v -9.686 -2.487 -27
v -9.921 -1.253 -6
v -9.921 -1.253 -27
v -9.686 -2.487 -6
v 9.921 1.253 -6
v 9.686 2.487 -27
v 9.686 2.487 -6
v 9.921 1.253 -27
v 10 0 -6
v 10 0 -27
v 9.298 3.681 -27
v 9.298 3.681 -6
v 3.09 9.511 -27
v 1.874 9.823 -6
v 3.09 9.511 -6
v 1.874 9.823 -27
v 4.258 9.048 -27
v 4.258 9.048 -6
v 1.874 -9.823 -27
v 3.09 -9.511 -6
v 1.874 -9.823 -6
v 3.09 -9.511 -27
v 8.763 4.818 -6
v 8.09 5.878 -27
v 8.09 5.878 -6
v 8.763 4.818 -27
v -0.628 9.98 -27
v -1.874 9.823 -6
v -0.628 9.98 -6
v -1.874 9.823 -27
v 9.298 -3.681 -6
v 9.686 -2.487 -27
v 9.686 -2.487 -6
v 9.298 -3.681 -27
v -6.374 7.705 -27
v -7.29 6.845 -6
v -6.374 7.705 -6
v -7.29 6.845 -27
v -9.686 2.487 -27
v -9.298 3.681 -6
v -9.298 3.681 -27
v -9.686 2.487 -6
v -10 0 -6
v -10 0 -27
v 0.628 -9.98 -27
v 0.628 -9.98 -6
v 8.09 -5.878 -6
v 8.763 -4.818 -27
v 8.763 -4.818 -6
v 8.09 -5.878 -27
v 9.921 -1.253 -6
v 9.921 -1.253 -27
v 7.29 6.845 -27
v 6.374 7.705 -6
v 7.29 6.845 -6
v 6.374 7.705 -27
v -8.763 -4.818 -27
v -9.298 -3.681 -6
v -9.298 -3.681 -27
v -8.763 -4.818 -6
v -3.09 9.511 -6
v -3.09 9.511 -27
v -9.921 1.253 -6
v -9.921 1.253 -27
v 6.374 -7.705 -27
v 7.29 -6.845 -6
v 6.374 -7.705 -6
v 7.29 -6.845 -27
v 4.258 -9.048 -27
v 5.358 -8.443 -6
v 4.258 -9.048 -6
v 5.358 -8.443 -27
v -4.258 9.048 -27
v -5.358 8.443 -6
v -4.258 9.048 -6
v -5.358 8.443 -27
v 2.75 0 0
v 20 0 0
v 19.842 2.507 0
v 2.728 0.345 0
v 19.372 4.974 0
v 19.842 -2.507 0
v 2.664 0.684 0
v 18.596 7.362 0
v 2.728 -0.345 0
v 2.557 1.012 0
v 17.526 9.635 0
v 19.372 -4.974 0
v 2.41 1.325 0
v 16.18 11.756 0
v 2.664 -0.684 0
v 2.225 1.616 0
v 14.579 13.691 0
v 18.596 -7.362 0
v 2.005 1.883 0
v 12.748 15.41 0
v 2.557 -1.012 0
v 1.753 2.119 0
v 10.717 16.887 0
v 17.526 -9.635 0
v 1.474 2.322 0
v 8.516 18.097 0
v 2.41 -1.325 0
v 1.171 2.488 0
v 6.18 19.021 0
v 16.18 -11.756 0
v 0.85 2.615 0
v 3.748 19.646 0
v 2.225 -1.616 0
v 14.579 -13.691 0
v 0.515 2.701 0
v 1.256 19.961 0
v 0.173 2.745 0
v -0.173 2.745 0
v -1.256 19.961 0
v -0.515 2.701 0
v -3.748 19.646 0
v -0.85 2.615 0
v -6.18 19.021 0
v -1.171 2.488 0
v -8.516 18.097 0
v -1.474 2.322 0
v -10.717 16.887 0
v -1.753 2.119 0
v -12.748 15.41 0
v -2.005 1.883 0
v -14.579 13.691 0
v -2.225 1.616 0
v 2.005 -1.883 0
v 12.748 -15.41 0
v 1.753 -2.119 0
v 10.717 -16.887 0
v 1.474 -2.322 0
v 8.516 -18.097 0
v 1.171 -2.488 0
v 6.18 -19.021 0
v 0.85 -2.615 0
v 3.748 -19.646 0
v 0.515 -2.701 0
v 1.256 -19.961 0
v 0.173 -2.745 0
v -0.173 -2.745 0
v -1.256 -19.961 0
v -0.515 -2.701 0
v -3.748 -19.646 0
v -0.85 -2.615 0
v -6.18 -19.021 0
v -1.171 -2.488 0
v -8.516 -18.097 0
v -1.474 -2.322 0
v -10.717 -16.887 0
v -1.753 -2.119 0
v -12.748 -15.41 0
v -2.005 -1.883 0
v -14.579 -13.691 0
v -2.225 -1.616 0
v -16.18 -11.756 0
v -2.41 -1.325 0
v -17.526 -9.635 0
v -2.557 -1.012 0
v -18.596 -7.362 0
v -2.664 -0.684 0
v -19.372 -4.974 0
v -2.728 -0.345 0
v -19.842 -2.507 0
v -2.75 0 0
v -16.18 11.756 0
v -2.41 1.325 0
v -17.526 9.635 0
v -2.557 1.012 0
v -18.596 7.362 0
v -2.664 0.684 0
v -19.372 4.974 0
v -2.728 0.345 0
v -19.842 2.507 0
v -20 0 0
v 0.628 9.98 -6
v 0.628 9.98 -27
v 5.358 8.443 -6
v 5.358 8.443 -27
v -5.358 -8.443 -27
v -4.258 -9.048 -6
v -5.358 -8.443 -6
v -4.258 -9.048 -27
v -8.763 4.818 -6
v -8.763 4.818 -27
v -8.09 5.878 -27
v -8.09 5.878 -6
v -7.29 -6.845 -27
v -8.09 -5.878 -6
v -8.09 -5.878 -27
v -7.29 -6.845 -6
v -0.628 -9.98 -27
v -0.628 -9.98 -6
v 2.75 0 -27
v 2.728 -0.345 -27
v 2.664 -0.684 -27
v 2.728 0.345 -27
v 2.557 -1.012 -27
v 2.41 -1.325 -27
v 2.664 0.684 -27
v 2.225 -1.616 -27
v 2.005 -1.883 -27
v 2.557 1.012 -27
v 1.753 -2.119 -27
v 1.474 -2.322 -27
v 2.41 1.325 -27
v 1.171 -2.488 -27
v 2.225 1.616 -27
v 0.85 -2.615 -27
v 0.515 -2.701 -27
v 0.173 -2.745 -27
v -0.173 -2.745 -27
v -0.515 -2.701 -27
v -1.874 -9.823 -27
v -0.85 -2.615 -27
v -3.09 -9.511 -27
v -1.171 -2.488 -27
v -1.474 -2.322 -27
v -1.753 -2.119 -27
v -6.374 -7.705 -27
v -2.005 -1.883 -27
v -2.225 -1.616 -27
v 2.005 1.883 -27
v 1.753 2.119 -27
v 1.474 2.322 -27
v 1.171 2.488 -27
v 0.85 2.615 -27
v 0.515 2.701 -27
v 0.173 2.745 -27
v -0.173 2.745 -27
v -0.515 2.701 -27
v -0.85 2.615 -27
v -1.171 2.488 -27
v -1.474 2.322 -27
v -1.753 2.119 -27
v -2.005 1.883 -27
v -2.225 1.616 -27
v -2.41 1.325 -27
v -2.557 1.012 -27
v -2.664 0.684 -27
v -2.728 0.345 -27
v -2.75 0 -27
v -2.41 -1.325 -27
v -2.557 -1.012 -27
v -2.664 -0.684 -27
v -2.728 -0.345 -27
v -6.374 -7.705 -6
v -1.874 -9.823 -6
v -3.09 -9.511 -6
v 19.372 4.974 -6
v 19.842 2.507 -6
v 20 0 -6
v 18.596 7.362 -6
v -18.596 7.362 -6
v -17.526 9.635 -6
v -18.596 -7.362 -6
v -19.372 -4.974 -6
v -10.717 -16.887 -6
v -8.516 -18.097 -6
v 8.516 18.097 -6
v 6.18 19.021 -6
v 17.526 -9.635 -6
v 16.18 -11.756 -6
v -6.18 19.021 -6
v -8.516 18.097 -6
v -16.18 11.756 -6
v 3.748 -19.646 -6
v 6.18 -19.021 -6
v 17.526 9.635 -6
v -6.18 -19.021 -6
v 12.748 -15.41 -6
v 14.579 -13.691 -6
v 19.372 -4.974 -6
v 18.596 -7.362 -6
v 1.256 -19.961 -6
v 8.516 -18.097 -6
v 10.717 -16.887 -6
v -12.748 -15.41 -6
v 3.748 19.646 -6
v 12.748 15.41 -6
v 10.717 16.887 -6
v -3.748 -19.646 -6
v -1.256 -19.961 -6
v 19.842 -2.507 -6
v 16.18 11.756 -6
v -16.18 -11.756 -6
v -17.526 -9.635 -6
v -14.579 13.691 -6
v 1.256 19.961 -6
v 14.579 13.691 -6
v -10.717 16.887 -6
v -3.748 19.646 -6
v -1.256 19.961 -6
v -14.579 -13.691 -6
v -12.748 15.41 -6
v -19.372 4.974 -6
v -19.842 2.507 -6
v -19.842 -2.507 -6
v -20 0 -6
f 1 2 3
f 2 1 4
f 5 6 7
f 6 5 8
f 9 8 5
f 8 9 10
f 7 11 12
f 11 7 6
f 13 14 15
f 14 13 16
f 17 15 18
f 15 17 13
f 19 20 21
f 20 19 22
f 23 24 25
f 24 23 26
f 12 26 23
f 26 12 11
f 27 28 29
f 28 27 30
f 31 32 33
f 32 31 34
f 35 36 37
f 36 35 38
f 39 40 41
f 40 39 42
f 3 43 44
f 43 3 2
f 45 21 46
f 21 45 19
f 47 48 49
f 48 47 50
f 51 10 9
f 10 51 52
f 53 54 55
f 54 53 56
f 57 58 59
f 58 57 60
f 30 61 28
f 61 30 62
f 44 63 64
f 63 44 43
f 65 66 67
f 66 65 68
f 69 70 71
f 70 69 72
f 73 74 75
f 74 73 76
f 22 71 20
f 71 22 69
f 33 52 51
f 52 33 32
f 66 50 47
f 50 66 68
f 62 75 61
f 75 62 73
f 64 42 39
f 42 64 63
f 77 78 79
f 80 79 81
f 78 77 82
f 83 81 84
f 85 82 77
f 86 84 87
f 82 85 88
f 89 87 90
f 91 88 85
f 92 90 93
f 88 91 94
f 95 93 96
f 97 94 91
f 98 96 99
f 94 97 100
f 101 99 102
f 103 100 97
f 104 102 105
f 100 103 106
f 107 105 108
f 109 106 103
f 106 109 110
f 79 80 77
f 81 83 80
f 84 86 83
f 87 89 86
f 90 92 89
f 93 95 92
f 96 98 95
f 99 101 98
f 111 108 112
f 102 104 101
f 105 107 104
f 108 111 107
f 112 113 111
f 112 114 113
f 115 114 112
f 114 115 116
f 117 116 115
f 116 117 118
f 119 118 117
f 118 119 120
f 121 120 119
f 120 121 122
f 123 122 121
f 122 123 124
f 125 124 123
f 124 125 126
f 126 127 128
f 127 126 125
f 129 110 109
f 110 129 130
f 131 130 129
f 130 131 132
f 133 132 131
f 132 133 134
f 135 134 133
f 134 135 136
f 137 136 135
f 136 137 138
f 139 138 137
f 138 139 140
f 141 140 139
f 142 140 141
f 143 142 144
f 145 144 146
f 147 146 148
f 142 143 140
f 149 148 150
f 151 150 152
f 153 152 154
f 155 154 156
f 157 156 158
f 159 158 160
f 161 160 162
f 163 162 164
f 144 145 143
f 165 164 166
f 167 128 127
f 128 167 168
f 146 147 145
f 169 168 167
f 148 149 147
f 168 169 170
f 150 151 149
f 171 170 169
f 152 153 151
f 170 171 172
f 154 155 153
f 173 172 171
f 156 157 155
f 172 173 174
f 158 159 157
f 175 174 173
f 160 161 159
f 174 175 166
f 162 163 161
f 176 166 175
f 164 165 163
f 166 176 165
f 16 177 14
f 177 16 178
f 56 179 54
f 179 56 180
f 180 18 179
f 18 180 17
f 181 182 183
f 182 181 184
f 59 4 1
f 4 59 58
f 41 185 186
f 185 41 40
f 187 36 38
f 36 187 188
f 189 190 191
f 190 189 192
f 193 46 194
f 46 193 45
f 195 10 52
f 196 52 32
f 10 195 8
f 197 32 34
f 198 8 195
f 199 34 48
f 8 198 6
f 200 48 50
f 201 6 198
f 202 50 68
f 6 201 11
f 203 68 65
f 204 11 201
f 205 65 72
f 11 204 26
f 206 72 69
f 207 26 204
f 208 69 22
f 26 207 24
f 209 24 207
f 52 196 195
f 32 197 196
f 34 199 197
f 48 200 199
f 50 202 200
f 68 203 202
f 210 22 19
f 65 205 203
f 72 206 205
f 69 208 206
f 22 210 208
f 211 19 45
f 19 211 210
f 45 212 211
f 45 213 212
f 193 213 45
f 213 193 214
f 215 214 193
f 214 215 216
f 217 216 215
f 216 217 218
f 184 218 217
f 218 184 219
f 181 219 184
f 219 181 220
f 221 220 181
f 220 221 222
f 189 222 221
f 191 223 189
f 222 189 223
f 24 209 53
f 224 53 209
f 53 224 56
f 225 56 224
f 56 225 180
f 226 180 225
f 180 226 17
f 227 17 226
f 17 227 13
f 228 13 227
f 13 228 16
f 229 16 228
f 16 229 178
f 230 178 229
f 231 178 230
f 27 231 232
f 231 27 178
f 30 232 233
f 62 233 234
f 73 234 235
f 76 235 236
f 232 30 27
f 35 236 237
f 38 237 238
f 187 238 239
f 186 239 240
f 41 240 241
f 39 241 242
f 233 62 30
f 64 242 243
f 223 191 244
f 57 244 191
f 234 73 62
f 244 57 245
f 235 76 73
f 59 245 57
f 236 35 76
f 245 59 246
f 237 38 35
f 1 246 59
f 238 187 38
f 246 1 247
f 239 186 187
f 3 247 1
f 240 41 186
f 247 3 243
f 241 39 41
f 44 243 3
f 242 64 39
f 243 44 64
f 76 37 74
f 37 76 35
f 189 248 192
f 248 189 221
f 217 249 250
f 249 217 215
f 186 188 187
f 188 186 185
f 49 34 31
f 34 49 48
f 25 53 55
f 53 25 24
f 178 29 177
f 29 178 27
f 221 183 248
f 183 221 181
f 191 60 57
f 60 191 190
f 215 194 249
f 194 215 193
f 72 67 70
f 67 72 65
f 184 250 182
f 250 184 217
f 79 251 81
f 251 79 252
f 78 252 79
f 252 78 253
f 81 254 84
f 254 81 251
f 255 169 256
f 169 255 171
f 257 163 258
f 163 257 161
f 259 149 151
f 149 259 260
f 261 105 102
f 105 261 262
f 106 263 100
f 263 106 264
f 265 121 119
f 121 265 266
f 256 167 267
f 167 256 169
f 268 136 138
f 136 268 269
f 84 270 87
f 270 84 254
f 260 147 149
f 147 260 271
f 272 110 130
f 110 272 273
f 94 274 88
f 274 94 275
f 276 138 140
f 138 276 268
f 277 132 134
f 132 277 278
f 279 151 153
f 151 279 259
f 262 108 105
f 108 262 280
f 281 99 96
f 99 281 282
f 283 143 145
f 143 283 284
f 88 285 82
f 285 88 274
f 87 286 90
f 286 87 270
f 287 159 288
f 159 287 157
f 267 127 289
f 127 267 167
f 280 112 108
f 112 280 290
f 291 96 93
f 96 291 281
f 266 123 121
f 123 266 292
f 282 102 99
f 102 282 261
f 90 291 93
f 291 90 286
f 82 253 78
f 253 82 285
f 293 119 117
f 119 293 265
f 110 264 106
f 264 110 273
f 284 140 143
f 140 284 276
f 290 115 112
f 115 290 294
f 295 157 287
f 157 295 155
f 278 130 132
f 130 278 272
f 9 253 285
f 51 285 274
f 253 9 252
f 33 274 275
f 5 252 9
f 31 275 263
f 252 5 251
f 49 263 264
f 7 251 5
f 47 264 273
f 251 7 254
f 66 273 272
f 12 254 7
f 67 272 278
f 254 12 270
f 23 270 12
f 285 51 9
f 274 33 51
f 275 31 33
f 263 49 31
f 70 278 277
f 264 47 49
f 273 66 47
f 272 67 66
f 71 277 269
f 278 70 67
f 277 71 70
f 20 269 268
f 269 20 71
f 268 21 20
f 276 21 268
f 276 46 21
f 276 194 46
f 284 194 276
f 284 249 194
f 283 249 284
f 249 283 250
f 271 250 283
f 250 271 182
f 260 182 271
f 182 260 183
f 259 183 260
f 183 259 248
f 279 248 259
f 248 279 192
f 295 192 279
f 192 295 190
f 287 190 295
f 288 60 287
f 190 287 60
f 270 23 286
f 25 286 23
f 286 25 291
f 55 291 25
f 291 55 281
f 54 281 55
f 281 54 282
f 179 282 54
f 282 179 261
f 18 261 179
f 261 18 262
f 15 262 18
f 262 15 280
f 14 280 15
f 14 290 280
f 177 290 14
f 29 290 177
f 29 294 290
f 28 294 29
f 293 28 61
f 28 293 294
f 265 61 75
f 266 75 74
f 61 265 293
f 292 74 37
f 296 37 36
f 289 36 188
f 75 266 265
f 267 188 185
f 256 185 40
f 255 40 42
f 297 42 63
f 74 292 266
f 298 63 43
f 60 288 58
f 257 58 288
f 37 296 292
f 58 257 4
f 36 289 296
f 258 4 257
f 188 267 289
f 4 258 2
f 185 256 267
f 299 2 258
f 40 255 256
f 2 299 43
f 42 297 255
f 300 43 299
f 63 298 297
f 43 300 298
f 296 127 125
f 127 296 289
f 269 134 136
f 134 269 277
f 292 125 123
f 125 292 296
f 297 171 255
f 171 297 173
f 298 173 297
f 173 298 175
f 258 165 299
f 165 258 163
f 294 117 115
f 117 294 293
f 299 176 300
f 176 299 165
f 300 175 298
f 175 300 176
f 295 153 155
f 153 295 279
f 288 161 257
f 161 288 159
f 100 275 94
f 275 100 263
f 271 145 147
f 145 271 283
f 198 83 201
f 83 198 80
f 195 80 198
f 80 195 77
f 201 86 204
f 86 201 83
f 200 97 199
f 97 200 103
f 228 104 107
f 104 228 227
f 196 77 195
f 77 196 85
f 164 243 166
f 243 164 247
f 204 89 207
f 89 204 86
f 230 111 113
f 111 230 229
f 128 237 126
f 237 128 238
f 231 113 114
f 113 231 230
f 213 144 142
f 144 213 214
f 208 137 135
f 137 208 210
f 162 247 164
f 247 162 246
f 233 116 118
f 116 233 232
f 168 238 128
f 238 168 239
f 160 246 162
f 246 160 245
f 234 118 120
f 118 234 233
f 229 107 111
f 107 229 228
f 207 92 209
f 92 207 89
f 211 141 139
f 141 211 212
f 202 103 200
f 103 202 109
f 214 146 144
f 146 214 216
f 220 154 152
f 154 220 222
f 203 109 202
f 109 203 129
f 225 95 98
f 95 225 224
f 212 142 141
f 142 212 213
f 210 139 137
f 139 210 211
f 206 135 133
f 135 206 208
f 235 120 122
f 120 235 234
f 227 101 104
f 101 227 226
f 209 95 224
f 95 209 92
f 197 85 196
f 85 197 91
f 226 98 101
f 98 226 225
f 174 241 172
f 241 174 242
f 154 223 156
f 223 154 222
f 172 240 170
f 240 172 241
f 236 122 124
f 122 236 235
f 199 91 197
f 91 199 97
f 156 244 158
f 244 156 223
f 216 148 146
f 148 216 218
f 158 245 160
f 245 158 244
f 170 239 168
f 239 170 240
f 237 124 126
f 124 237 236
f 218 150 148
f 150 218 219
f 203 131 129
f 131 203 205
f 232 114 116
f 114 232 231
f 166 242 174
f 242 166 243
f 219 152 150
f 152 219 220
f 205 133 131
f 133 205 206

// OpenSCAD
$fn = 50;


difference() {
	union() {
		translate(v = [0, 0, -27.0000000000]) {
			cylinder(h = 27, r = 10.0000000000);
		}
		translate(v = [0, 0, -6.0000000000]) {
			cylinder(h = 6, r = 20.0000000000);
		}
	}
	union() {
		#translate(v = [0, 0, -27]) {
			cylinder(h = 27, r = 2.7500000000);
		}
	}
}
